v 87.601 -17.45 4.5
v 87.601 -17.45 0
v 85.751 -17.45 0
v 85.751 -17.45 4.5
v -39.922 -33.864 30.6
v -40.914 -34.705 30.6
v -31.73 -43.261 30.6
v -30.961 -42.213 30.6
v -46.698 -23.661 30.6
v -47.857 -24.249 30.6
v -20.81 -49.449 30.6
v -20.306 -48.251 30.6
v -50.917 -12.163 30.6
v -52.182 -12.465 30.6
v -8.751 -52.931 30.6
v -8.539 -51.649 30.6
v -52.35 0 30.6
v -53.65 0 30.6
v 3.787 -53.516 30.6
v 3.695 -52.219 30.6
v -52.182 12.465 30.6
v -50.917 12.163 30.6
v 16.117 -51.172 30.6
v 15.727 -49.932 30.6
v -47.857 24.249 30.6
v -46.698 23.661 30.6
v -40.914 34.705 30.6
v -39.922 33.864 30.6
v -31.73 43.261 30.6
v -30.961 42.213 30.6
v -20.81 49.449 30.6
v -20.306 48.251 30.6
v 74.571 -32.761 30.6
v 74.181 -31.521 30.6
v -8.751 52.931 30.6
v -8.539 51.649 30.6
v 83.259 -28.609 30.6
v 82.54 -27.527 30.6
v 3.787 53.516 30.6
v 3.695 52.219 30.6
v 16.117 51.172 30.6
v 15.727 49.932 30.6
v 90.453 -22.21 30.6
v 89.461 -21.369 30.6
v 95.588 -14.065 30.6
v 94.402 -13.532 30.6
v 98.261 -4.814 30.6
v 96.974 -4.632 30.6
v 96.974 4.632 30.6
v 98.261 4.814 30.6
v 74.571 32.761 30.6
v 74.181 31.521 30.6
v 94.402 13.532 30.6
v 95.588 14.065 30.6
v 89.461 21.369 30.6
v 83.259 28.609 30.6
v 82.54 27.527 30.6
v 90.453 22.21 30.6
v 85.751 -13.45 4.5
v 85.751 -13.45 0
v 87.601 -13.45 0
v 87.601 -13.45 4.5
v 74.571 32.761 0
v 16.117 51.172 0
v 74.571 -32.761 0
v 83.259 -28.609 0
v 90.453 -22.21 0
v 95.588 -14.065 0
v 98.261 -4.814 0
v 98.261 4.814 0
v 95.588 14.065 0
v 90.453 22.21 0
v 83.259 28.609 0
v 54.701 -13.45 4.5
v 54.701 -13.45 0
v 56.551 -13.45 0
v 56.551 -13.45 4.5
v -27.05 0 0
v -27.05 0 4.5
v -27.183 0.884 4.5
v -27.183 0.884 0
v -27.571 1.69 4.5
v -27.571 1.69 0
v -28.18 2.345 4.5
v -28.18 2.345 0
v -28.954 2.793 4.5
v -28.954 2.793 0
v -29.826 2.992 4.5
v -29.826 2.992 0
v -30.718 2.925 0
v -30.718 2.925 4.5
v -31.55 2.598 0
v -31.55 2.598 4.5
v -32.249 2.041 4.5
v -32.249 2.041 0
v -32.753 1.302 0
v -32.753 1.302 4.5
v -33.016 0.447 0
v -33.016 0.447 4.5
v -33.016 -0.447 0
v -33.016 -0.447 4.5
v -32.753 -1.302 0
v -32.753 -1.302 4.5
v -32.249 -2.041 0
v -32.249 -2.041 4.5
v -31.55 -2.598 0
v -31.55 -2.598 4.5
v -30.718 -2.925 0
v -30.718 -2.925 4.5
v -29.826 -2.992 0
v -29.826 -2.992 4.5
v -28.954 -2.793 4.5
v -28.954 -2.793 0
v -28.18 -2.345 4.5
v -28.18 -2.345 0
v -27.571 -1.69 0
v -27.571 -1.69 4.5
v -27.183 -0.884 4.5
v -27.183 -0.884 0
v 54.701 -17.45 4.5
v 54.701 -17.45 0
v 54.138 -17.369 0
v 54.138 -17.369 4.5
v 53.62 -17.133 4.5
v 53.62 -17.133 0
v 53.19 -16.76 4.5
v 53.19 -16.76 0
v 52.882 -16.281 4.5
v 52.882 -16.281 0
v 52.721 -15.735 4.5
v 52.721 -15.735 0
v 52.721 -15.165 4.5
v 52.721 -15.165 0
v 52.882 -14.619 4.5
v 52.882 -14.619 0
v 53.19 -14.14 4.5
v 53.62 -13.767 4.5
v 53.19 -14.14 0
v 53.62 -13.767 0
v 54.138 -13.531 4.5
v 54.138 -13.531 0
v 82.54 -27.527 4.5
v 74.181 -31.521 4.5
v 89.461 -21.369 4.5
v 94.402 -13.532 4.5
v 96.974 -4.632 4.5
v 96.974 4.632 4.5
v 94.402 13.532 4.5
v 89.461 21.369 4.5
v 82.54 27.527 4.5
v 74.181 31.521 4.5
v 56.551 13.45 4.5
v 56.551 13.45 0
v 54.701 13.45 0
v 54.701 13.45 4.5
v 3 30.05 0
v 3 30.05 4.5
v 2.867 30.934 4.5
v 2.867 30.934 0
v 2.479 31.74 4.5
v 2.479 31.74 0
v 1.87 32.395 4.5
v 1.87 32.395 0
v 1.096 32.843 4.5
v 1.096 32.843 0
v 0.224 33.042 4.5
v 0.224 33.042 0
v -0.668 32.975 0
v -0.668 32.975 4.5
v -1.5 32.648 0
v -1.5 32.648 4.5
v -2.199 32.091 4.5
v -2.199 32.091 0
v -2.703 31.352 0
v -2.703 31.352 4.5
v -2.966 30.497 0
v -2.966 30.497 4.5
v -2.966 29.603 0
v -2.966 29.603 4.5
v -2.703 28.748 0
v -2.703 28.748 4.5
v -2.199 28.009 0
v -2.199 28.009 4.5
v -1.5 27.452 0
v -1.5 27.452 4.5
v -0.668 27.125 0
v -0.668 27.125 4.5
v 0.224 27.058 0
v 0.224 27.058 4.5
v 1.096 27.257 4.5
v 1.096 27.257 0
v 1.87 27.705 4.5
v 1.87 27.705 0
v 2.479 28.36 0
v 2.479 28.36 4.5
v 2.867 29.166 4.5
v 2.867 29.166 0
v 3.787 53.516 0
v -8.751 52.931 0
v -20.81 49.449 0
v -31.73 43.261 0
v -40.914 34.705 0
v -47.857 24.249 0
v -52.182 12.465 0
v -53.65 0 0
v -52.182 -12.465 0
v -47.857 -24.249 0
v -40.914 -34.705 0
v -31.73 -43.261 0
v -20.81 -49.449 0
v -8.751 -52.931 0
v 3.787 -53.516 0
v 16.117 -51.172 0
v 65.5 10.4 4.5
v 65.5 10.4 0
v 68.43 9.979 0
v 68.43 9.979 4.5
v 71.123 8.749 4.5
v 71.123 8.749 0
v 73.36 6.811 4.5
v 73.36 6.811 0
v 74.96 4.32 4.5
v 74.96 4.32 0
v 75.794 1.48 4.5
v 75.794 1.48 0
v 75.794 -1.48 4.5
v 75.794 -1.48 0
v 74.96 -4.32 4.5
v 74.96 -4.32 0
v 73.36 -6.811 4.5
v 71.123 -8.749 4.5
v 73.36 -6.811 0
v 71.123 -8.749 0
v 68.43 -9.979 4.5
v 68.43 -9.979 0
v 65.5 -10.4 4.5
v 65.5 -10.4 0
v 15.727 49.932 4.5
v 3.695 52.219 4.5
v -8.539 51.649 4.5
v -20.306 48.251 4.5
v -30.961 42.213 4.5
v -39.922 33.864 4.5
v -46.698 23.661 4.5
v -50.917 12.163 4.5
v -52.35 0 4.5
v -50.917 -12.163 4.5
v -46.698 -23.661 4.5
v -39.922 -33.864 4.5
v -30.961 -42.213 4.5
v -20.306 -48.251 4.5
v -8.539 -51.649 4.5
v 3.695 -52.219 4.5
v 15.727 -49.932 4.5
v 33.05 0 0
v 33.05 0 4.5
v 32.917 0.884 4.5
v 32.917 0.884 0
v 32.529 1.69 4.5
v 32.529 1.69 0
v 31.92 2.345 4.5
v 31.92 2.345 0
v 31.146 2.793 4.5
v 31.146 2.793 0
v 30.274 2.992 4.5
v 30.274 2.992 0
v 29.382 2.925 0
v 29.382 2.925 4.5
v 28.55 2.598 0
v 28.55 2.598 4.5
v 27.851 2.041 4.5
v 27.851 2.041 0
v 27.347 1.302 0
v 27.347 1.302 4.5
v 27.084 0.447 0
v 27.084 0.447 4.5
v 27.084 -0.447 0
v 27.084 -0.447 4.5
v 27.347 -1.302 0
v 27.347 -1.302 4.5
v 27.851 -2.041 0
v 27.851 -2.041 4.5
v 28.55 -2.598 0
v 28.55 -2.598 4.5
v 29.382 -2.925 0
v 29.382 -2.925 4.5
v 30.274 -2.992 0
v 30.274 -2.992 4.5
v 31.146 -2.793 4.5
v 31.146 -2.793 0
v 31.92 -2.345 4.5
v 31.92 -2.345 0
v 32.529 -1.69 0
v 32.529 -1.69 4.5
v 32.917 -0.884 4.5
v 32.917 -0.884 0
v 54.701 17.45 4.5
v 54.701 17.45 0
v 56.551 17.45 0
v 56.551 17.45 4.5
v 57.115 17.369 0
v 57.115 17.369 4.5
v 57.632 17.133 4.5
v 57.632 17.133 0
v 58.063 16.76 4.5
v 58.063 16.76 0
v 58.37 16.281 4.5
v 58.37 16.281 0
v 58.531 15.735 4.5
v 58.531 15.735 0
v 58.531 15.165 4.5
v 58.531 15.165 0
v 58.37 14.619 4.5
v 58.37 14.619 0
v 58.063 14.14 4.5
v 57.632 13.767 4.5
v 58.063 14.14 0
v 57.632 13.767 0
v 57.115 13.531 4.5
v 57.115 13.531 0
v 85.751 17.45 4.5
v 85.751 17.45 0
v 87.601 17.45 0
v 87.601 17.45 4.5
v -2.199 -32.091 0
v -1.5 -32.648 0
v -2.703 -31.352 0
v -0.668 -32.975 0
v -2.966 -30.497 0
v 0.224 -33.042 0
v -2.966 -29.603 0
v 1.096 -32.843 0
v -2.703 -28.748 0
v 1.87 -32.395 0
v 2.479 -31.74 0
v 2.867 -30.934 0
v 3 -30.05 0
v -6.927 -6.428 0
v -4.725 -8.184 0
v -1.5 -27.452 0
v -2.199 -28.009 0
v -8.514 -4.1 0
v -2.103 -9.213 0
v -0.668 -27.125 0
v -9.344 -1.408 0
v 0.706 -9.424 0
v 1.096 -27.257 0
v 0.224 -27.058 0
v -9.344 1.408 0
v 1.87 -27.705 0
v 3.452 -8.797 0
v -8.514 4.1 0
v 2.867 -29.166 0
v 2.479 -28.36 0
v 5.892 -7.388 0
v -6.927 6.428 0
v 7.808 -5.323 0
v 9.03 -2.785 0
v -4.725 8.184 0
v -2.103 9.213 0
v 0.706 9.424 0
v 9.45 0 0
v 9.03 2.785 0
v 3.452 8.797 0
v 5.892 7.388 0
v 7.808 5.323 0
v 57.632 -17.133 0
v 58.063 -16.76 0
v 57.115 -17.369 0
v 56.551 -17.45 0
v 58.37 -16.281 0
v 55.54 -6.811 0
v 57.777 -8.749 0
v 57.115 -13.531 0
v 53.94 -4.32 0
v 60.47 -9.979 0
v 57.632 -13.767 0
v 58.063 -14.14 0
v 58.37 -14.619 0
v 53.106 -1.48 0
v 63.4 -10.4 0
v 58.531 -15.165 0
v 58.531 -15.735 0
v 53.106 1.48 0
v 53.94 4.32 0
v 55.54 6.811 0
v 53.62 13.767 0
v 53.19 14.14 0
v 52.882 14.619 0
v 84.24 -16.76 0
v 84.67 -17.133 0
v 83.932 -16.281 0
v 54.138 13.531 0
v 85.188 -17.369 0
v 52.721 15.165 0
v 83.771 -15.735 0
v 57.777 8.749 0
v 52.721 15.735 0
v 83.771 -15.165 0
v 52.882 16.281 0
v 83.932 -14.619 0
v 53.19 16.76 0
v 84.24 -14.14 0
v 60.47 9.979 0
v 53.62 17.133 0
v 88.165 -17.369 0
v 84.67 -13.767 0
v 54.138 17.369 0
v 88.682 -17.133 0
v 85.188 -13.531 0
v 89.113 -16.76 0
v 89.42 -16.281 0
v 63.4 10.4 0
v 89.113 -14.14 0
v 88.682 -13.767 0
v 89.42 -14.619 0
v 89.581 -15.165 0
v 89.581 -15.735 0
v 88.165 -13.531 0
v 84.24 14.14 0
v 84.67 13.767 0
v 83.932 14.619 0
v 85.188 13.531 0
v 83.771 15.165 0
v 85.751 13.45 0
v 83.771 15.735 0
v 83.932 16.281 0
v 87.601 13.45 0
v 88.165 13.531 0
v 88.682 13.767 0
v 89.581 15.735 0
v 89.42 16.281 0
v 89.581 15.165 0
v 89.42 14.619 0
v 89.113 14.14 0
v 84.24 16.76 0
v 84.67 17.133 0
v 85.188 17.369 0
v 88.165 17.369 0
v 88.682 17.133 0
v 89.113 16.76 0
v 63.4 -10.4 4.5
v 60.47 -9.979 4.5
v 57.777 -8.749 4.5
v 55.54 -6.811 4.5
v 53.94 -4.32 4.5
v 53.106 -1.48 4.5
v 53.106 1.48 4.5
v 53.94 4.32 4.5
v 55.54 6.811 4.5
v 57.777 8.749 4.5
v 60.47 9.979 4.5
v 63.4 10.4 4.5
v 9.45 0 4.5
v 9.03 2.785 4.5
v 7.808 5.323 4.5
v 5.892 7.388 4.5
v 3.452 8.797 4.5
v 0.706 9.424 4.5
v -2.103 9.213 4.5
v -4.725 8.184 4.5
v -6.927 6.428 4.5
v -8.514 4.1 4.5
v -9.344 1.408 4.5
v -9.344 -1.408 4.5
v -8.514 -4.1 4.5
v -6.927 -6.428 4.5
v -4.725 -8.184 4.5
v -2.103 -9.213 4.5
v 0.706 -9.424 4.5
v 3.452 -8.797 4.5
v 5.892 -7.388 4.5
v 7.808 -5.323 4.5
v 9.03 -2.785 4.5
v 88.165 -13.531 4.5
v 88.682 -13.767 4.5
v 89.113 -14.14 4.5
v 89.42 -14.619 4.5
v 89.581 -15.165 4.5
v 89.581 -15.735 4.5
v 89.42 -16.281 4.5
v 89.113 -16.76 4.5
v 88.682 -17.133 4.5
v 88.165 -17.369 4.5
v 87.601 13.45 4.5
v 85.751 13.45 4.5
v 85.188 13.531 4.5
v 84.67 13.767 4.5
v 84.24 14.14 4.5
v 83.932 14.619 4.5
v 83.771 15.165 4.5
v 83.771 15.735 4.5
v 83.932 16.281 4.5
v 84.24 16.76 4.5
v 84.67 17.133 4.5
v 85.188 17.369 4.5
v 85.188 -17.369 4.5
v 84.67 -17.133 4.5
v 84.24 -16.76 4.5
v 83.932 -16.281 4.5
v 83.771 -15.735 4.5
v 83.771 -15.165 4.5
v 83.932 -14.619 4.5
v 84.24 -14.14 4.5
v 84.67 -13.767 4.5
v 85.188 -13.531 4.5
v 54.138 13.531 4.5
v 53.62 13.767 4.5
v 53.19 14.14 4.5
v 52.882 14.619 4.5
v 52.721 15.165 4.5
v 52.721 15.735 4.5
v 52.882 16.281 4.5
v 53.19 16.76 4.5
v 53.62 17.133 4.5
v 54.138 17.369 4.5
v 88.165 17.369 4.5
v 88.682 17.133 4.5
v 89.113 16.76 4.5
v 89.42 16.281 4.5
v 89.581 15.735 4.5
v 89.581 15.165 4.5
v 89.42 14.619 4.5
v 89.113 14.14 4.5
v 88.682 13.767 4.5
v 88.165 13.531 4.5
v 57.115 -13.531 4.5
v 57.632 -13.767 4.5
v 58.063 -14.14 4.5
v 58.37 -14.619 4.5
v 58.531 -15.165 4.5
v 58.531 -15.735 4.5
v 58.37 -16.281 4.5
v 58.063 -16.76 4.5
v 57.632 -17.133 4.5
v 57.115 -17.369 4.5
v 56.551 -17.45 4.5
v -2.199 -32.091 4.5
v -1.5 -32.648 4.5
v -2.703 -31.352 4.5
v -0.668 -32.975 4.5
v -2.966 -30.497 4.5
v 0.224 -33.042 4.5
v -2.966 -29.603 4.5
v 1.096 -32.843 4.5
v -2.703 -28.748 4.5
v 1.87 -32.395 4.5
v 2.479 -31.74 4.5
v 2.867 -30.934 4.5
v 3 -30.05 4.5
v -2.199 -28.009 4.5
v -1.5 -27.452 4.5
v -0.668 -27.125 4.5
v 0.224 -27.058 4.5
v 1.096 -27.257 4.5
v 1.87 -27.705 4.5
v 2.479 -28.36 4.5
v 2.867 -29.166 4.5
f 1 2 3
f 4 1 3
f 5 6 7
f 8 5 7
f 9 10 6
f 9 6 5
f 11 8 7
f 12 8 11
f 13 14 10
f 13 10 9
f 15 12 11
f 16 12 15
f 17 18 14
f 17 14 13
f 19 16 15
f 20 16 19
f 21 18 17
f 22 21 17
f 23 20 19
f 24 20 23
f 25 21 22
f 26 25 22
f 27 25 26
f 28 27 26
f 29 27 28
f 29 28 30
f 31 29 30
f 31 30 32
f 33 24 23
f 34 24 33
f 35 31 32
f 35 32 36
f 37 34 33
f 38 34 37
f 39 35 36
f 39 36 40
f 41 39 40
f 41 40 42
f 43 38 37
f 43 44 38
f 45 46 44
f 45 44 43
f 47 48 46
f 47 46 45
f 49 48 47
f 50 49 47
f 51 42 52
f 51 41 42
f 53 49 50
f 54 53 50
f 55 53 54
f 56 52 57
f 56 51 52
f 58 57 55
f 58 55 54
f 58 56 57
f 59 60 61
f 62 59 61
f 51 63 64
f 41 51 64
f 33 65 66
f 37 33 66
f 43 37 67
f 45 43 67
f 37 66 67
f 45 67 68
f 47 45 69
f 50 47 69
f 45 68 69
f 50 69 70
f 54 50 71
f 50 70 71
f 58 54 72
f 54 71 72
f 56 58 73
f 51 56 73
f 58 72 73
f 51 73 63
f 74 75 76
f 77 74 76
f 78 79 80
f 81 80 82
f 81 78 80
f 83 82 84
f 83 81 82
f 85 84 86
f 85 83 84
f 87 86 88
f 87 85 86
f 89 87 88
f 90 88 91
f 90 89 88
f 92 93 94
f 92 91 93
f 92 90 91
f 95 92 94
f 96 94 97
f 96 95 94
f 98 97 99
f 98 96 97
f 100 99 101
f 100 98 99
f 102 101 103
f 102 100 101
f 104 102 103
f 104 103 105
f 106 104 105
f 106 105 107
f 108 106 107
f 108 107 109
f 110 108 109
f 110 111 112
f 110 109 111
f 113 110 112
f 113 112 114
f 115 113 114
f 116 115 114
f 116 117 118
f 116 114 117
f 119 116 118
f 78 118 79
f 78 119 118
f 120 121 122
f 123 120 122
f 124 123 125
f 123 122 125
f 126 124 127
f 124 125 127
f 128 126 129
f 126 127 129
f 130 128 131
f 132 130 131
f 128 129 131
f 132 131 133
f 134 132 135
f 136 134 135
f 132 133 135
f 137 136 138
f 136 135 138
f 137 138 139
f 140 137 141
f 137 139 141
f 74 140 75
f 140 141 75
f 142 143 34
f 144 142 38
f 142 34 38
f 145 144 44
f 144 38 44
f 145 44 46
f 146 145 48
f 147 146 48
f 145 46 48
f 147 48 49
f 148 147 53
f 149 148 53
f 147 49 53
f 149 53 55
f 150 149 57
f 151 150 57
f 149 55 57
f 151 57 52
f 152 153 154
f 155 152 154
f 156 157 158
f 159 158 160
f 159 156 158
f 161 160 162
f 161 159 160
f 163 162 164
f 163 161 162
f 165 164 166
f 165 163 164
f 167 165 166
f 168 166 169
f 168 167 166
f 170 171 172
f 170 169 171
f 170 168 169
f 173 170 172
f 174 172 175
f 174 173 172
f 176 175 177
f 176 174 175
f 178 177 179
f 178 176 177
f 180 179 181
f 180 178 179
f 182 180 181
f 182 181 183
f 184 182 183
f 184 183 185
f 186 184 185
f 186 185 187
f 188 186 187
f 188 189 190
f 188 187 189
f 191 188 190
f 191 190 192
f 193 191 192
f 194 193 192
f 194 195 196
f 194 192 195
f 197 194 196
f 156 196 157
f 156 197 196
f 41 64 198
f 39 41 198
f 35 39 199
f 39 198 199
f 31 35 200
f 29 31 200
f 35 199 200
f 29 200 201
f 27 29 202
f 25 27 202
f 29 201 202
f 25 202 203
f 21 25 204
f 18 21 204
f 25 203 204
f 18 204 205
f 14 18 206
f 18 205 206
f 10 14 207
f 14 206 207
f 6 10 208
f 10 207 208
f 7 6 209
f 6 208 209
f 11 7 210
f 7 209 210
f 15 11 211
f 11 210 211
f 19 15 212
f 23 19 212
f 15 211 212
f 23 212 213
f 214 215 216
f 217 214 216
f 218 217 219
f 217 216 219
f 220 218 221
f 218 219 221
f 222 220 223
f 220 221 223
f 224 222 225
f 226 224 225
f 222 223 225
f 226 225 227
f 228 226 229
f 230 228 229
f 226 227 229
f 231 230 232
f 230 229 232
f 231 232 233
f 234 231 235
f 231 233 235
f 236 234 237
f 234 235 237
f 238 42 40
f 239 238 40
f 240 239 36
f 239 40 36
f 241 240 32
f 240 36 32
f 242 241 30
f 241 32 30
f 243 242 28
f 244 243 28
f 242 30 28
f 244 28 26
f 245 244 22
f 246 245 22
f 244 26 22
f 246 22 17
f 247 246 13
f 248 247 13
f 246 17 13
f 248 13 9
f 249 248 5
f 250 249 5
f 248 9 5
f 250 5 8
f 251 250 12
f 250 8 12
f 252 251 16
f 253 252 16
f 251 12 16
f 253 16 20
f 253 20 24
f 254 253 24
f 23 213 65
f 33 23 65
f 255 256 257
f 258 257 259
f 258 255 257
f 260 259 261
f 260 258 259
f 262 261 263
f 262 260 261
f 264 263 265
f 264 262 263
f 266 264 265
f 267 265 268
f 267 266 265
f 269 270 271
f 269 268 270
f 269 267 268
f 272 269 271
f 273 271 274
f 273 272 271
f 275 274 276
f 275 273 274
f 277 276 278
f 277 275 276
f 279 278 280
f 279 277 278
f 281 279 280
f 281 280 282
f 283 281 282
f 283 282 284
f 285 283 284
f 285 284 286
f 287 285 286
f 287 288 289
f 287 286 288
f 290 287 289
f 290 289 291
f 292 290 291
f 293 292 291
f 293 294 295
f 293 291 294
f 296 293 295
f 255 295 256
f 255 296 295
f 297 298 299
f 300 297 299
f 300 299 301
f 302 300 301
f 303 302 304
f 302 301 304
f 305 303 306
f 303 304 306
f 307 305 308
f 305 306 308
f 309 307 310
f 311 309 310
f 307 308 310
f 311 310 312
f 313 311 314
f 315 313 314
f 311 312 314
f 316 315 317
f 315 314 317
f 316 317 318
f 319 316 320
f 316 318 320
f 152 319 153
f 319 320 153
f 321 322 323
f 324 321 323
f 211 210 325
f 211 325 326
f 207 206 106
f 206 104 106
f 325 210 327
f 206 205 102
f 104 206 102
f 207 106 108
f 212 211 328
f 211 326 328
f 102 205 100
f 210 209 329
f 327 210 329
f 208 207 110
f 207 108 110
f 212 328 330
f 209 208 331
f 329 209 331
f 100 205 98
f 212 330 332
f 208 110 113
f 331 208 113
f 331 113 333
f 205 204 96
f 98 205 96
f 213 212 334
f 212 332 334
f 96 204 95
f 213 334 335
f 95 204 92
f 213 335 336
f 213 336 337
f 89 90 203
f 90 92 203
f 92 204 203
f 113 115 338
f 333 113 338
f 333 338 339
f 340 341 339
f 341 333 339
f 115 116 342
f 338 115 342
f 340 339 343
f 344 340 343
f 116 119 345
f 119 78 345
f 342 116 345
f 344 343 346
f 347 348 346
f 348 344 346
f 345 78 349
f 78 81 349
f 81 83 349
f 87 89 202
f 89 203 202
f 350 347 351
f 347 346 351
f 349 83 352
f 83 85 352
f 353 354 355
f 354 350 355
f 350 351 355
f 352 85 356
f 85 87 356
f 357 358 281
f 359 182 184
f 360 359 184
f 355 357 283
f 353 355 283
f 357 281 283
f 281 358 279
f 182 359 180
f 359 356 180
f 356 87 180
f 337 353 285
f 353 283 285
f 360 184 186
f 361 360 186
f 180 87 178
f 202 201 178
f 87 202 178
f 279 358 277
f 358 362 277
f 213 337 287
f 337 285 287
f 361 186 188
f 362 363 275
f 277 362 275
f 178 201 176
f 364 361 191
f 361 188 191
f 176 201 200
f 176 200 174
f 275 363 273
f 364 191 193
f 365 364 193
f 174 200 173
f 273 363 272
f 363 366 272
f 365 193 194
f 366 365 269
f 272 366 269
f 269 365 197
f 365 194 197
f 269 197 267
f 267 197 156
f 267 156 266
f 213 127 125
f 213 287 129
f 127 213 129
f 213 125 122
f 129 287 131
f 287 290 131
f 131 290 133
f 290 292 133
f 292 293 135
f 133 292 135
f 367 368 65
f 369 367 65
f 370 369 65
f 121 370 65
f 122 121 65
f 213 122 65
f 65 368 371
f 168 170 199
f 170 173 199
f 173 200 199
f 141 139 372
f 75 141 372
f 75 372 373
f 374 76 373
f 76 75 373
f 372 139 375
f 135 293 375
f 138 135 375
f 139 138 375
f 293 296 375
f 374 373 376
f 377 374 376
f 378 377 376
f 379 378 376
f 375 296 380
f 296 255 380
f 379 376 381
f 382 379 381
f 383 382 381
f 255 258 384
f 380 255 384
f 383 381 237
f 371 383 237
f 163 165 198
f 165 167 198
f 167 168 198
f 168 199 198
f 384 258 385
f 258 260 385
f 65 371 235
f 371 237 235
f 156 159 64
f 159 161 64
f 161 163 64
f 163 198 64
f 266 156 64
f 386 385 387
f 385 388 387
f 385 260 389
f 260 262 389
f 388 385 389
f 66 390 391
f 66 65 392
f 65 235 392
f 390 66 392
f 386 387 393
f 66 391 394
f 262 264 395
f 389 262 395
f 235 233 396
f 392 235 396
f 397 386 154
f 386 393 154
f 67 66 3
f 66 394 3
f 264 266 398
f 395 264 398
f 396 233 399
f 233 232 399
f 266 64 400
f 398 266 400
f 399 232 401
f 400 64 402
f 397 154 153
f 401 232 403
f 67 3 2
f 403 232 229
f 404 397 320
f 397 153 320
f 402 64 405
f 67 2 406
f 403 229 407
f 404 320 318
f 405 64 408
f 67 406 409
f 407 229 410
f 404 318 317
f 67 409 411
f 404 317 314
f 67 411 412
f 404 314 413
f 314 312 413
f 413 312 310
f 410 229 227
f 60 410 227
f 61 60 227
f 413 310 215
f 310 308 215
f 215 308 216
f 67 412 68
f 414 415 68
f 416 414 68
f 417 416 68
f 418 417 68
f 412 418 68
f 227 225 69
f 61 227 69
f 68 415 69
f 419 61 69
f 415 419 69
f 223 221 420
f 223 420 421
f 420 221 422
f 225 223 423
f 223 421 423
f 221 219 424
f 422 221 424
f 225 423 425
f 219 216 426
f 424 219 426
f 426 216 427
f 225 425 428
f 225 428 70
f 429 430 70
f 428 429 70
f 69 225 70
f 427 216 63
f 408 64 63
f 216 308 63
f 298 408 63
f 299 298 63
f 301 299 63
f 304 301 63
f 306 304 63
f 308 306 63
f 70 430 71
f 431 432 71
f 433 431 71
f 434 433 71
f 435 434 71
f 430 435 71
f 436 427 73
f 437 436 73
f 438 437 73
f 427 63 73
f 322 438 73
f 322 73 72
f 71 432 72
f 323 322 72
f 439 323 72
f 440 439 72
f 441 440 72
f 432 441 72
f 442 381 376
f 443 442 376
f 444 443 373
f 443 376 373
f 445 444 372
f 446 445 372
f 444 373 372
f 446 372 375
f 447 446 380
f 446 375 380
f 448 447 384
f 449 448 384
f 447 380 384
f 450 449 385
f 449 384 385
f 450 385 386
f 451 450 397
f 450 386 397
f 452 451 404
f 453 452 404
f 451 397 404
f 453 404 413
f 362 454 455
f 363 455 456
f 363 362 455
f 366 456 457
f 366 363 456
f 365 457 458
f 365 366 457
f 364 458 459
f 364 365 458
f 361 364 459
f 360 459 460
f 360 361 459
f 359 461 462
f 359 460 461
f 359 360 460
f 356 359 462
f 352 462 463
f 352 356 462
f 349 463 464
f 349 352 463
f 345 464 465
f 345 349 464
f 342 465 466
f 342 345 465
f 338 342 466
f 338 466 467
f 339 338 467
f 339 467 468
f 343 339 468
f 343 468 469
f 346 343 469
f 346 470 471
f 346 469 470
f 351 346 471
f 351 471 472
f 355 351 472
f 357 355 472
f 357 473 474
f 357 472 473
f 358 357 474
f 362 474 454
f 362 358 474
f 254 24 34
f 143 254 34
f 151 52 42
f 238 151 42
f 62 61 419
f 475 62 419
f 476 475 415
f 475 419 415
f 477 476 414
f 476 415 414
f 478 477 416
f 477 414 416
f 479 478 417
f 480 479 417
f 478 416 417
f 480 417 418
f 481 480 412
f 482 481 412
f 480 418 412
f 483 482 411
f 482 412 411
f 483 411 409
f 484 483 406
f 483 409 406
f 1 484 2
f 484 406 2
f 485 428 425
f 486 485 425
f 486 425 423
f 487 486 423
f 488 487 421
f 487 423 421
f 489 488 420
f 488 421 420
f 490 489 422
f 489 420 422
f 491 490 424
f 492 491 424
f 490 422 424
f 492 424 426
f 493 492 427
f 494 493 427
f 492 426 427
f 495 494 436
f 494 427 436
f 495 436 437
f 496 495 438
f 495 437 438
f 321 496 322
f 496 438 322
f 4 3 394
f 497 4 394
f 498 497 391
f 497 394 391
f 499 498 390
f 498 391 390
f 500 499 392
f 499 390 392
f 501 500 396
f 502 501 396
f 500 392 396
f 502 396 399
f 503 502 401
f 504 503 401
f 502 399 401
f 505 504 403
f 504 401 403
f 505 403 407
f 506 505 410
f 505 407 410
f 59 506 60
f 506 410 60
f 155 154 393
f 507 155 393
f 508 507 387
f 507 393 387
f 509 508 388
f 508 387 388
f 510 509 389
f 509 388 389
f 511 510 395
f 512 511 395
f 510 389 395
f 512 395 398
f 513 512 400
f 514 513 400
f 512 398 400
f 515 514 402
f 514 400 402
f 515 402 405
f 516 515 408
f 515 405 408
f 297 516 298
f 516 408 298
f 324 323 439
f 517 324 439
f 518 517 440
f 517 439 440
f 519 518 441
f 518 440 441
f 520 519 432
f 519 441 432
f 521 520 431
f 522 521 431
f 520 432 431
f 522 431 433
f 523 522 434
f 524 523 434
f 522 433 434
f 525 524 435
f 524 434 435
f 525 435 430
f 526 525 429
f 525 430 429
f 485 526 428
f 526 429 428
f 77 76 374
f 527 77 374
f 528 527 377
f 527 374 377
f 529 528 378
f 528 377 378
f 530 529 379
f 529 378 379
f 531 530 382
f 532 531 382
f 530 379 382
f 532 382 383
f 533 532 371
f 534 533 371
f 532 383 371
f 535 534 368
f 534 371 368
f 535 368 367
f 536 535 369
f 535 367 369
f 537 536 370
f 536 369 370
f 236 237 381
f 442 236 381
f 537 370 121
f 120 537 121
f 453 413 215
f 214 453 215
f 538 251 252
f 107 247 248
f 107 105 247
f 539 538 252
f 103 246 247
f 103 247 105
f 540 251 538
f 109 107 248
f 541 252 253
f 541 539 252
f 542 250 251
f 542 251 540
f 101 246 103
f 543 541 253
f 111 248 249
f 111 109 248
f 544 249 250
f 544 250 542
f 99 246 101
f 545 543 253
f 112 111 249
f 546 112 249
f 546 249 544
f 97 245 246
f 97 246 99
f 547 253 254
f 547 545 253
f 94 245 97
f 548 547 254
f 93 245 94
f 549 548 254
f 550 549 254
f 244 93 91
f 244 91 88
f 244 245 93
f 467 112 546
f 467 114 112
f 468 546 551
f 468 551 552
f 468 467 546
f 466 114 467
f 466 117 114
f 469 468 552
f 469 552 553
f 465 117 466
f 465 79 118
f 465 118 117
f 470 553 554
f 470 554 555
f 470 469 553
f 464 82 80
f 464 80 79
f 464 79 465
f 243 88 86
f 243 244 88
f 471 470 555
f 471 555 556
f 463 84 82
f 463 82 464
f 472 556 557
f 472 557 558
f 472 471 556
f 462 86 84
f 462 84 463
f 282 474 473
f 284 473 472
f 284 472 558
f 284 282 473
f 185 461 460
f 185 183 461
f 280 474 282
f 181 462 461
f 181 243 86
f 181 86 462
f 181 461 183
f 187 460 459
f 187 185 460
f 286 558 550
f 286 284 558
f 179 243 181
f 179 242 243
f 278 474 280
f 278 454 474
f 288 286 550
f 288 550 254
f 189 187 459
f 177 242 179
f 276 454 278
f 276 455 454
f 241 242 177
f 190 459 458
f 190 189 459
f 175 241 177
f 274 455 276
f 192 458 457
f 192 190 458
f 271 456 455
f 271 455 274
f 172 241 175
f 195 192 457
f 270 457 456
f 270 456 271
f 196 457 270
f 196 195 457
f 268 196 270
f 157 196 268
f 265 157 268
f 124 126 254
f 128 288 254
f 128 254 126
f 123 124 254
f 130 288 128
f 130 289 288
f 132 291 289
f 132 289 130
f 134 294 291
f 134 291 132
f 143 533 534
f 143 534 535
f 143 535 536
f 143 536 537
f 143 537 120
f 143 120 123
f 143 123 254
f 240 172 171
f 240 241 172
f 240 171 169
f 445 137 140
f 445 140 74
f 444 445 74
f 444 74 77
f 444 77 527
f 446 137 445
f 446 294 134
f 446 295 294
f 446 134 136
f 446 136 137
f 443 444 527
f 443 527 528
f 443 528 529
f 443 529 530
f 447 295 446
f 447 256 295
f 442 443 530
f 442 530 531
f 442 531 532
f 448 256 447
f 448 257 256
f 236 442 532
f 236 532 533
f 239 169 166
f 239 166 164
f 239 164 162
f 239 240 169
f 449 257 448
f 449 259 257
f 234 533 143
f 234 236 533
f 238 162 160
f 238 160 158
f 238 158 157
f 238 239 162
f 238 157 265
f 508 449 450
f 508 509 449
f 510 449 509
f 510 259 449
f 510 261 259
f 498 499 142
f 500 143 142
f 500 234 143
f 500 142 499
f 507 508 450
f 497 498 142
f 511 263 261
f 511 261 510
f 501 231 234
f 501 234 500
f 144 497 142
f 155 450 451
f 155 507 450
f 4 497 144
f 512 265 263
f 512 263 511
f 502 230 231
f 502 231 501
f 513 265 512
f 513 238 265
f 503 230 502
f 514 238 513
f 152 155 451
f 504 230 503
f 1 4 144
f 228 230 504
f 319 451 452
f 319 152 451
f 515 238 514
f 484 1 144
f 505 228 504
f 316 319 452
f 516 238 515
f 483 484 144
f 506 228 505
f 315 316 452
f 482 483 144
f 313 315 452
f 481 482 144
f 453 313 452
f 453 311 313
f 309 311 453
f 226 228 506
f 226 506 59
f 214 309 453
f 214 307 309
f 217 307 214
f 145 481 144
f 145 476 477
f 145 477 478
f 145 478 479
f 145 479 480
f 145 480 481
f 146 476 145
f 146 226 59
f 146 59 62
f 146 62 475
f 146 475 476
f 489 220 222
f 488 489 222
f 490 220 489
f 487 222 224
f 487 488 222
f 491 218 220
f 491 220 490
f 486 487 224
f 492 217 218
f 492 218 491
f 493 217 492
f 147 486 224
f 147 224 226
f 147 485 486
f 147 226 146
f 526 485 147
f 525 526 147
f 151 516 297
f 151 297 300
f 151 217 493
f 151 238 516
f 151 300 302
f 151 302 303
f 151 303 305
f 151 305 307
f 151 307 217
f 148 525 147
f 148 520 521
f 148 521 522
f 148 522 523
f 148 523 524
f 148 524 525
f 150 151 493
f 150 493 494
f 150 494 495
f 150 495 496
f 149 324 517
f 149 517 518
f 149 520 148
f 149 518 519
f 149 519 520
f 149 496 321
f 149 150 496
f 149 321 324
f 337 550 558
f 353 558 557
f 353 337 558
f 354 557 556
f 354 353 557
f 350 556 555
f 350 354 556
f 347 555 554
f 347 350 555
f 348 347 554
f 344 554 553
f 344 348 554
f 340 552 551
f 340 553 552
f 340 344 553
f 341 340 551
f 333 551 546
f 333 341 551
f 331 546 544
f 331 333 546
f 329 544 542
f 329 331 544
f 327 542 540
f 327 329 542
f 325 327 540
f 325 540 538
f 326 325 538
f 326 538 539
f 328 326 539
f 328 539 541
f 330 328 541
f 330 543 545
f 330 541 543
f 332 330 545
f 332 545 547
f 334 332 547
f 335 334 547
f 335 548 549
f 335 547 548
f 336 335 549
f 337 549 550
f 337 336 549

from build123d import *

# Parameters (mm, degrees)
SKETCH1_R           = 3
SKETCH1_R_2         = 9.45
BOSS_EXTRUDE1_DEPTH = 30.6
CUT_EXTRUDE1_DEPTH  = 26.1


with BuildPart() as part:
    # Sketch1 → Boss-Extrude1 (new body)
    with BuildSketch(Plane.XY):
        with BuildLine():
            ThreePointArc((74.571121214, -32.760854905), (98.6, 0), (74.571121214, 32.760854905))
            Line((74.571121214, 32.760854905), (16.117374778, 51.171796238))
            ThreePointArc((16.117374778, 51.171796238), (-53.65, 0), (16.117374778, -51.171796238))
            Line((16.117374778, -51.171796238), (74.571121214, -32.760854905))
        make_face()
        with BuildLine():
            Line((63.4, 10.4), (65.5, 10.4))
            ThreePointArc((65.5, 10.4), (75.9, 0), (65.5, -10.4))
            Line((65.5, -10.4), (63.4, -10.4))
            ThreePointArc((63.4, -10.4), (53, 0), (63.4, 10.4))
        make_face(mode=Mode.SUBTRACT)
        with Locations((30.05, 0)):
            Circle(SKETCH1_R, mode=Mode.SUBTRACT)
        with BuildLine():
            Line((56.551094978, -17.45), (54.701094978, -17.45))
            ThreePointArc((54.701094978, -17.45), (52.701094978, -15.45), (54.701094978, -13.45))
            Line((54.701094978, -13.45), (56.551094978, -13.45))
            ThreePointArc((56.551094978, -13.45), (58.551094978, -15.45), (56.551094978, -17.45))
        make_face(mode=Mode.SUBTRACT)
        with BuildLine():
            Line((87.601094978, -17.45), (85.751094978, -17.45))
            ThreePointArc((85.751094978, -17.45), (83.751094978, -15.45), (85.751094978, -13.45))
            Line((85.751094978, -13.45), (87.601094978, -13.45))
            ThreePointArc((87.601094978, -13.45), (89.601094978, -15.45), (87.601094978, -17.45))
        make_face(mode=Mode.SUBTRACT)
        with BuildLine():
            ThreePointArc((54.701094978, 13.45), (52.701094978, 15.45), (54.701094978, 17.45))
            Line((54.701094978, 17.45), (56.551094978, 17.45))
            ThreePointArc((56.551094978, 17.45), (58.551094978, 15.45), (56.551094978, 13.45))
            Line((56.551094978, 13.45), (54.701094978, 13.45))
        make_face(mode=Mode.SUBTRACT)
        with BuildLine():
            ThreePointArc((85.751094978, 13.45), (83.751094978, 15.45), (85.751094978, 17.45))
            Line((85.751094978, 17.45), (87.601094978, 17.45))
            ThreePointArc((87.601094978, 17.45), (89.601094978, 15.45), (87.601094978, 13.45))
            Line((87.601094978, 13.45), (85.751094978, 13.45))
        make_face(mode=Mode.SUBTRACT)
        Circle(SKETCH1_R_2, mode=Mode.SUBTRACT)
        with Locations((0, 30.05)):
            Circle(SKETCH1_R, mode=Mode.SUBTRACT)
        with Locations((0, -30.05)):
            Circle(SKETCH1_R, mode=Mode.SUBTRACT)
        with Locations((-30.05, 0)):
            Circle(SKETCH1_R, mode=Mode.SUBTRACT)
    extrude(amount=BOSS_EXTRUDE1_DEPTH)

    # Sketch2 → Cut-Extrude1 (cut)
    with BuildSketch(Plane.XY.offset(30.6)):
        with BuildLine():
            Line((74.180579048, 31.520904576), (15.726832612, 49.93184591))
            ThreePointArc((15.726832612, 49.93184591), (-52.35, 0), (15.726832612, -49.93184591))
            Line((15.726832612, -49.93184591), (74.180579048, -31.520904576))
            ThreePointArc((74.180579048, -31.520904576), (97.3, 0), (74.180579048, 31.520904576))
        make_face()
    extrude(amount=-CUT_EXTRUDE1_DEPTH, mode=Mode.SUBTRACT)


solid = part.part
